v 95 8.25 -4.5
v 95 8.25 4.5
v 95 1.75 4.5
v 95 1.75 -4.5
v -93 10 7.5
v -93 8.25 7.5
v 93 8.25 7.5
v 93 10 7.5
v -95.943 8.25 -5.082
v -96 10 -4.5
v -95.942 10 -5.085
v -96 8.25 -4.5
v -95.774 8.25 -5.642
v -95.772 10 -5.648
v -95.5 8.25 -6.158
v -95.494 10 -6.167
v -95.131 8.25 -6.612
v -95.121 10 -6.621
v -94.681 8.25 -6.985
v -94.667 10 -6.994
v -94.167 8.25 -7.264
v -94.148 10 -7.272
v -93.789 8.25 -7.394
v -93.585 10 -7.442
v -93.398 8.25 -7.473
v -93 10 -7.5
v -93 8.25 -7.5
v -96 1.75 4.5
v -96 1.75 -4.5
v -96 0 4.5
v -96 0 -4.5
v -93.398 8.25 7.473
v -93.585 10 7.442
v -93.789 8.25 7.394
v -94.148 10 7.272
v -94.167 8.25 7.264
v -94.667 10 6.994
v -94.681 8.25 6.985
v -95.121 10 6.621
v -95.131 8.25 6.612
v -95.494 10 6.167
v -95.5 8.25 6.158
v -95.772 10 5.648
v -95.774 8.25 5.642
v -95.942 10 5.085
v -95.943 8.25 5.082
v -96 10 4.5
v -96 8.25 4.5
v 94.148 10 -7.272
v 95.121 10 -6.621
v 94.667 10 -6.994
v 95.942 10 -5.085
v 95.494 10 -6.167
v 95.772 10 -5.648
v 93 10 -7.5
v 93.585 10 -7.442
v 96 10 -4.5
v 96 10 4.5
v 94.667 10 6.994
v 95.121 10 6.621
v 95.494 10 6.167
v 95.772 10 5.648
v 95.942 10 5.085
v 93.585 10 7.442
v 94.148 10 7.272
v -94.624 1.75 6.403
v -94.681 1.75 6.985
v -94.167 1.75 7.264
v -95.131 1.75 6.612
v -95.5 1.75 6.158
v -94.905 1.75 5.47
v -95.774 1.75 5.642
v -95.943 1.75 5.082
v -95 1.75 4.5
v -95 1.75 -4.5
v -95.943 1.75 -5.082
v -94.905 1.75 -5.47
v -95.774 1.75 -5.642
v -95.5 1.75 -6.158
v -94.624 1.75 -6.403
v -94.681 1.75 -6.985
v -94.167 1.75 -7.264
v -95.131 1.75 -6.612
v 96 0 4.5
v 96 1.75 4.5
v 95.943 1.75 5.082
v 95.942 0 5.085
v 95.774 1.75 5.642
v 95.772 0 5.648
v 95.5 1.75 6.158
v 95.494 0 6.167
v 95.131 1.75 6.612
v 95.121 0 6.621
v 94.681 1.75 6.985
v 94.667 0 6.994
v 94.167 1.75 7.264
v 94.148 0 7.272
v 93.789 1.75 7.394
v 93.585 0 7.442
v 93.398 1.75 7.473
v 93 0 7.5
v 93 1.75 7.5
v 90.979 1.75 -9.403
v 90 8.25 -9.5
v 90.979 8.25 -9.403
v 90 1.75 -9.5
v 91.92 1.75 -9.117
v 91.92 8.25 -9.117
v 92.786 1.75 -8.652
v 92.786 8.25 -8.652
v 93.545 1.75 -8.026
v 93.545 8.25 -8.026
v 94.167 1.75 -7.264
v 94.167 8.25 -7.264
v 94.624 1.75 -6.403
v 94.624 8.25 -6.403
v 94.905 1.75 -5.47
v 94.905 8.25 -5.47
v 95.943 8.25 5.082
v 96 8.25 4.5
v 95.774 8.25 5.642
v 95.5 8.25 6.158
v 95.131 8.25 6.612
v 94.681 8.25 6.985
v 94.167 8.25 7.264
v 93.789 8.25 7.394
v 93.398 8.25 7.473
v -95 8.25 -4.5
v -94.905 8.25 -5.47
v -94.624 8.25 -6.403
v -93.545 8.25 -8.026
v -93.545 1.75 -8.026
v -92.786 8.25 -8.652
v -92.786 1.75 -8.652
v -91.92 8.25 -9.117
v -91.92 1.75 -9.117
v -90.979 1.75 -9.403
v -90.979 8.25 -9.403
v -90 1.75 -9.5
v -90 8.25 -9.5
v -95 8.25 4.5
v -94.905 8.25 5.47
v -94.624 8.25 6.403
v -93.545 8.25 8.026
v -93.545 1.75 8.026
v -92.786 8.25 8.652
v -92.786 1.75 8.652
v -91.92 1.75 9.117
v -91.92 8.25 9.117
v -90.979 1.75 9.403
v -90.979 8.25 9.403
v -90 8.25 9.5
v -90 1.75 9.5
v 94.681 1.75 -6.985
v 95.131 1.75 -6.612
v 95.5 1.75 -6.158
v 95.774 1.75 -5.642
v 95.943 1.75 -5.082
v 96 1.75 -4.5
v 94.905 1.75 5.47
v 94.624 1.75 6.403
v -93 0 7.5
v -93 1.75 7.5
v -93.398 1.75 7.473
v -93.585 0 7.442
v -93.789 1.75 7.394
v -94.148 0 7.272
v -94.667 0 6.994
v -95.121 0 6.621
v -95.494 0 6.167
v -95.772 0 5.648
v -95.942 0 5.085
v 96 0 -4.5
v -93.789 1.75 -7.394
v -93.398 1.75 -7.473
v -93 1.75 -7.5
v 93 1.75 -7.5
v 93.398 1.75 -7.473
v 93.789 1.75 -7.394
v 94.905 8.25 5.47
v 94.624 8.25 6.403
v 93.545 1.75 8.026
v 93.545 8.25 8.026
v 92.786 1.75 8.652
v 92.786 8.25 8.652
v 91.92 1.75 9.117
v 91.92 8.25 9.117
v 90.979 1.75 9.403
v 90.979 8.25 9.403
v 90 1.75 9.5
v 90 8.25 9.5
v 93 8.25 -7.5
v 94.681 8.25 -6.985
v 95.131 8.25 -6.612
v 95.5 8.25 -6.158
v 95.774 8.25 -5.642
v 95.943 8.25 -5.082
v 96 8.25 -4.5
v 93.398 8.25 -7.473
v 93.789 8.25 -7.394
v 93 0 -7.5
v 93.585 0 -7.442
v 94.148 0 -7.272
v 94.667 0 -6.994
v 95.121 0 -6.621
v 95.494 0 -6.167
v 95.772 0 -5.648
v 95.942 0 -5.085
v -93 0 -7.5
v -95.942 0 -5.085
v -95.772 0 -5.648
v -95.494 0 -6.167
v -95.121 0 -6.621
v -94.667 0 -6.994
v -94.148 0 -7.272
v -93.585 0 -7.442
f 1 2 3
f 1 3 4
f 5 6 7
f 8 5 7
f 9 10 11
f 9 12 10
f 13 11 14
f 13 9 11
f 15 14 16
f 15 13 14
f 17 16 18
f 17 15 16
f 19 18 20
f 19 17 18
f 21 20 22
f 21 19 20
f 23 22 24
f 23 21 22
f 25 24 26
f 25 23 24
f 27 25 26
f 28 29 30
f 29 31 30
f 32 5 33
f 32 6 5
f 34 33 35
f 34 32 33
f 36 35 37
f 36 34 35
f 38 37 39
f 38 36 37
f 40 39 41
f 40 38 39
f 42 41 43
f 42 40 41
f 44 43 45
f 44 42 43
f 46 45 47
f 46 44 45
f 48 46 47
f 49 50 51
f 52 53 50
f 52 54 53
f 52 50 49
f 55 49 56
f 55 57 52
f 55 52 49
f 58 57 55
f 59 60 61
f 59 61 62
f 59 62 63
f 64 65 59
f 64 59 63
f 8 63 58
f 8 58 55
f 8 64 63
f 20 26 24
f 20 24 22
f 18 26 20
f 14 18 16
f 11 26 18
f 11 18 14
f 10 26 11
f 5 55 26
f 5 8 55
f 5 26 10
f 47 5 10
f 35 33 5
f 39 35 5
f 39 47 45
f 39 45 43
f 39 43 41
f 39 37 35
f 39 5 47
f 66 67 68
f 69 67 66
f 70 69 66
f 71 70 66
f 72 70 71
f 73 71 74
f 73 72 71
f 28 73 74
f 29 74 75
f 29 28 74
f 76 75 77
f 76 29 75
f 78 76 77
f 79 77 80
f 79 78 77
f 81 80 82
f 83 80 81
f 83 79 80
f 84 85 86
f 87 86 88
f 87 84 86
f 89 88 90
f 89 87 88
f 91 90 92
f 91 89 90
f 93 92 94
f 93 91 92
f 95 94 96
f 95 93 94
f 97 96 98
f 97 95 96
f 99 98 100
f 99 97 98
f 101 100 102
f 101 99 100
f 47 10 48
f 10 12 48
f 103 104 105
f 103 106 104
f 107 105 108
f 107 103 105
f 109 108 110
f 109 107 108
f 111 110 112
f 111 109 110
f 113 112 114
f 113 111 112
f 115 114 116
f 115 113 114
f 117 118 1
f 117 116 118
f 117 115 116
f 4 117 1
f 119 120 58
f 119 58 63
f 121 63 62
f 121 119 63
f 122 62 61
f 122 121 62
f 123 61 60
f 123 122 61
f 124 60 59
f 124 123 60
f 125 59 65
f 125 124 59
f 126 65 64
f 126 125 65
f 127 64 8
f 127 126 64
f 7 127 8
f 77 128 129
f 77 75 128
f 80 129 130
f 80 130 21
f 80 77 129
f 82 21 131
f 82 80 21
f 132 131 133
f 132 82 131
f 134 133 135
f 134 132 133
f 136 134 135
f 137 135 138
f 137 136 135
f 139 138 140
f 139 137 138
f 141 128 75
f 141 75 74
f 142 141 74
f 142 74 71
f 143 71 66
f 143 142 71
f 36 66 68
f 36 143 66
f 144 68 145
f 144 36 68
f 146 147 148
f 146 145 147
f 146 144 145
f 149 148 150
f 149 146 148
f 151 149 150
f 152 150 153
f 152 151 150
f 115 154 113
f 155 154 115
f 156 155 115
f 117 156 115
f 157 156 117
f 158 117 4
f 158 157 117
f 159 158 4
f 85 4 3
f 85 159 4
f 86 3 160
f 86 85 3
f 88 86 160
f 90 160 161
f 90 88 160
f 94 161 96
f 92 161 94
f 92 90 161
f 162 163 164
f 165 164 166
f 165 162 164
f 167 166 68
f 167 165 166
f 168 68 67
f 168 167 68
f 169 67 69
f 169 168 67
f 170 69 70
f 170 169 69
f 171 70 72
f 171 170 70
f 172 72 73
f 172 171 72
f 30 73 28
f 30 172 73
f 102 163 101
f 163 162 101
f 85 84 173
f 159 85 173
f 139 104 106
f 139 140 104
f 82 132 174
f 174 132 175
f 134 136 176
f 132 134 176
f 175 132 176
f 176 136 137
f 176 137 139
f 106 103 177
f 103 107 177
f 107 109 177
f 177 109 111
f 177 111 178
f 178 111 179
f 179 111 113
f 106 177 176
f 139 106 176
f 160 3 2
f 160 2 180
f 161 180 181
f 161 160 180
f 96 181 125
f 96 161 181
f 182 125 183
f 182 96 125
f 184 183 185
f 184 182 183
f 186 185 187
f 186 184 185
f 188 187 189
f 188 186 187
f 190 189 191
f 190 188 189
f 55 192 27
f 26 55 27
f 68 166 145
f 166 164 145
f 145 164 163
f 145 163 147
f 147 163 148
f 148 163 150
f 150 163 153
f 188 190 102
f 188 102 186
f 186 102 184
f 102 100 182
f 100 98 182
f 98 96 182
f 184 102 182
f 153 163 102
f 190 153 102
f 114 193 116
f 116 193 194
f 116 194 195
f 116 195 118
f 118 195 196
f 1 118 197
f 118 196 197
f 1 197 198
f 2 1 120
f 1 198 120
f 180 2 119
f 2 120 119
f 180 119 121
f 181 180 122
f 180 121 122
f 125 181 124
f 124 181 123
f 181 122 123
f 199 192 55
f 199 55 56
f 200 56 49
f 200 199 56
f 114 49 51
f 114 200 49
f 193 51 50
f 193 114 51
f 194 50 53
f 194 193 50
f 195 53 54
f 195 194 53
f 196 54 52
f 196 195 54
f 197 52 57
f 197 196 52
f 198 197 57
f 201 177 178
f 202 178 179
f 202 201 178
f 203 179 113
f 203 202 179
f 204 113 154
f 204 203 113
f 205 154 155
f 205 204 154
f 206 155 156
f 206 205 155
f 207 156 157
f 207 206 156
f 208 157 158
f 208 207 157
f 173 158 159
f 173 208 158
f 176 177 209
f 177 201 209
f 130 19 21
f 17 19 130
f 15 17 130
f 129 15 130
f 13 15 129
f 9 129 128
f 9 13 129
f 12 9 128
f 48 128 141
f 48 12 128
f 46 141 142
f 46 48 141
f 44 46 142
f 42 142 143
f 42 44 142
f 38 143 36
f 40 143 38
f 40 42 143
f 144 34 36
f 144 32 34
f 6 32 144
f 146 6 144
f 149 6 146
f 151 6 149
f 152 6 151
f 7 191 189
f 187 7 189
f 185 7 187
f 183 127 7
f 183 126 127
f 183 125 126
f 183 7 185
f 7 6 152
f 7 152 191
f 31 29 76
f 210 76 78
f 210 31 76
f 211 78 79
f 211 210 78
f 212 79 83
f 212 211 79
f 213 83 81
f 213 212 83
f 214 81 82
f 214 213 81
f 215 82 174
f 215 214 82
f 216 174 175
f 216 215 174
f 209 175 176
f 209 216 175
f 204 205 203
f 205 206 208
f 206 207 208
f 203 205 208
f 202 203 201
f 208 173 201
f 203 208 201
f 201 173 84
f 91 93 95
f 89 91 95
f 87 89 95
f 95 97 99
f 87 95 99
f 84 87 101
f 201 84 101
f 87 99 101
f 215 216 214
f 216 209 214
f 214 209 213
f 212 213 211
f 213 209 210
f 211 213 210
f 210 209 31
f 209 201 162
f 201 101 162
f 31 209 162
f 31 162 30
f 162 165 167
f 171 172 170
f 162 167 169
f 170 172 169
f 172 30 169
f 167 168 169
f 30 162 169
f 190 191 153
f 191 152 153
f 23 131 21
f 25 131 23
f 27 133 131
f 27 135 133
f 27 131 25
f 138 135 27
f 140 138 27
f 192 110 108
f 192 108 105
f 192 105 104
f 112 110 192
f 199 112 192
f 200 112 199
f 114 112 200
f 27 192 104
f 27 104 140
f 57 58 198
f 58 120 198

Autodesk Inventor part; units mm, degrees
ref_plane "YZ Plane" through (0, 0, 0) normal (1, 0, 0) x (0, 1, 0)
ref_plane "XZ Plane" through (0, 0, 0) normal (0, 1, 0) x (-1, 0, 0)
ref_plane "XY Plane" through (0, 0, 0) normal (0, 0, 1) x (1, 0, 0)
sketch "Boceto1" plane through (0, 0, 0) normal (0, 1, 0) x (-1, 0, 0)
  line L0 (96, 7.5) -> (-96, 7.5)
  line L1 (-96, 7.5) -> (-96, -7.5)
  line L2 (-96, -7.5) -> (96, -7.5)
  line L3 (96, -7.5) -> (96, 7.5)
  line L4 (96, 7.5) -> (-96, -7.5) construction
  line L5 (-96, 7.5) -> (96, -7.5) construction
  point P0 (0, 0)
  dimension "d0" = 192
  dimension "d1" = 15
extrude "Extrusión1" add sketch "Boceto1" along normal blind 10
sketch "Boceto2" plane through (0, 0, 0) normal (1, 0, 0) x (0, 1, 0)
  line L0 (0, 7.5) -> (10, 7.5) projected
  line L1 (1.75, 7.5) -> (8.25, 7.5)
  line L2 (8.25, 7.5) -> (8.25, 9.5)
  line L3 (8.25, 9.5) -> (1.75, 9.5)
  line L4 (1.75, 9.5) -> (1.75, 7.5)
  line L5 (0, -7.5) -> (0, 7.5) projected
  line L6 (0, -7.5) -> (10, -7.5) projected
  line L7 (1.75, -7.5) -> (8.25, -7.5)
  line L8 (8.25, -7.5) -> (8.25, -9.5)
  line L9 (8.25, -9.5) -> (1.75, -9.5)
  line L10 (1.75, -9.5) -> (1.75, -7.5)
  point P0 (0, 0)
  dimension "d4" = 6.5
  dimension "d5" = 1.75
  dimension "d6" = 2
extrude "Extrusión2" add sketch "Boceto2" along normal mid plane 192
sketch "Boceto4" plane through (-96, 0, -7.5) normal (-1, 0, 0) x (0, 0, 1)
  line L0 (15, 1.75) -> (17, 1.75) projected
  line L1 (0, 8.25) -> (-2, 8.25) projected
  line L2 (17, 1.75) -> (-2, 1.75)
  line L3 (-2, 1.75) -> (-2, 8.25)
  line L4 (-2, 8.25) -> (17, 8.25)
  line L5 (17, 8.25) -> (17, 1.75)
  point P0 (7.5, 0)
  point P1 (15, 1.75)
  point P2 (0, 8.25)
extrude "Extrusión3" cut sketch "Boceto4" against normal blind 1
sketch "Boceto5" plane through (96, 0, 7.5) normal (1, 0, 0) x (0, 0, -1)
  line L0 (0, 8.25) -> (-2, 8.25) projected
  line L1 (17, 1.75) -> (17, 8.25) projected
  line L2 (-2, 8.25) -> (17, 8.25)
  line L3 (17, 8.25) -> (17, 1.75)
  line L4 (17, 1.75) -> (-2, 1.75)
  line L5 (-2, 1.75) -> (-2, 8.25)
  point P0 (7.5, 0)
  point P1 (17, 8.25)
  point P2 (0, 8.25)
extrude "Extrusión4" cut sketch "Boceto5" against normal blind 1
fillet "Empalme1" radius 5 4 edges at (95, 5, -9.5) (95, 5, 9.5) (-95, 5, -9.5) (-95, 5, 9.5)
fillet "Empalme2" radius 3 8 edges at (96, 9.125, 7.5) (96, 0.875, 7.5) (96, 9.125, -7.5) (96, 0.875, -7.5) (-96, 0.875, 7.5) (-96, 9.125, 7.5) (-96, 0.875, -7.5) (-96, 9.125, -7.5)
properties part number "GT2Rack"
